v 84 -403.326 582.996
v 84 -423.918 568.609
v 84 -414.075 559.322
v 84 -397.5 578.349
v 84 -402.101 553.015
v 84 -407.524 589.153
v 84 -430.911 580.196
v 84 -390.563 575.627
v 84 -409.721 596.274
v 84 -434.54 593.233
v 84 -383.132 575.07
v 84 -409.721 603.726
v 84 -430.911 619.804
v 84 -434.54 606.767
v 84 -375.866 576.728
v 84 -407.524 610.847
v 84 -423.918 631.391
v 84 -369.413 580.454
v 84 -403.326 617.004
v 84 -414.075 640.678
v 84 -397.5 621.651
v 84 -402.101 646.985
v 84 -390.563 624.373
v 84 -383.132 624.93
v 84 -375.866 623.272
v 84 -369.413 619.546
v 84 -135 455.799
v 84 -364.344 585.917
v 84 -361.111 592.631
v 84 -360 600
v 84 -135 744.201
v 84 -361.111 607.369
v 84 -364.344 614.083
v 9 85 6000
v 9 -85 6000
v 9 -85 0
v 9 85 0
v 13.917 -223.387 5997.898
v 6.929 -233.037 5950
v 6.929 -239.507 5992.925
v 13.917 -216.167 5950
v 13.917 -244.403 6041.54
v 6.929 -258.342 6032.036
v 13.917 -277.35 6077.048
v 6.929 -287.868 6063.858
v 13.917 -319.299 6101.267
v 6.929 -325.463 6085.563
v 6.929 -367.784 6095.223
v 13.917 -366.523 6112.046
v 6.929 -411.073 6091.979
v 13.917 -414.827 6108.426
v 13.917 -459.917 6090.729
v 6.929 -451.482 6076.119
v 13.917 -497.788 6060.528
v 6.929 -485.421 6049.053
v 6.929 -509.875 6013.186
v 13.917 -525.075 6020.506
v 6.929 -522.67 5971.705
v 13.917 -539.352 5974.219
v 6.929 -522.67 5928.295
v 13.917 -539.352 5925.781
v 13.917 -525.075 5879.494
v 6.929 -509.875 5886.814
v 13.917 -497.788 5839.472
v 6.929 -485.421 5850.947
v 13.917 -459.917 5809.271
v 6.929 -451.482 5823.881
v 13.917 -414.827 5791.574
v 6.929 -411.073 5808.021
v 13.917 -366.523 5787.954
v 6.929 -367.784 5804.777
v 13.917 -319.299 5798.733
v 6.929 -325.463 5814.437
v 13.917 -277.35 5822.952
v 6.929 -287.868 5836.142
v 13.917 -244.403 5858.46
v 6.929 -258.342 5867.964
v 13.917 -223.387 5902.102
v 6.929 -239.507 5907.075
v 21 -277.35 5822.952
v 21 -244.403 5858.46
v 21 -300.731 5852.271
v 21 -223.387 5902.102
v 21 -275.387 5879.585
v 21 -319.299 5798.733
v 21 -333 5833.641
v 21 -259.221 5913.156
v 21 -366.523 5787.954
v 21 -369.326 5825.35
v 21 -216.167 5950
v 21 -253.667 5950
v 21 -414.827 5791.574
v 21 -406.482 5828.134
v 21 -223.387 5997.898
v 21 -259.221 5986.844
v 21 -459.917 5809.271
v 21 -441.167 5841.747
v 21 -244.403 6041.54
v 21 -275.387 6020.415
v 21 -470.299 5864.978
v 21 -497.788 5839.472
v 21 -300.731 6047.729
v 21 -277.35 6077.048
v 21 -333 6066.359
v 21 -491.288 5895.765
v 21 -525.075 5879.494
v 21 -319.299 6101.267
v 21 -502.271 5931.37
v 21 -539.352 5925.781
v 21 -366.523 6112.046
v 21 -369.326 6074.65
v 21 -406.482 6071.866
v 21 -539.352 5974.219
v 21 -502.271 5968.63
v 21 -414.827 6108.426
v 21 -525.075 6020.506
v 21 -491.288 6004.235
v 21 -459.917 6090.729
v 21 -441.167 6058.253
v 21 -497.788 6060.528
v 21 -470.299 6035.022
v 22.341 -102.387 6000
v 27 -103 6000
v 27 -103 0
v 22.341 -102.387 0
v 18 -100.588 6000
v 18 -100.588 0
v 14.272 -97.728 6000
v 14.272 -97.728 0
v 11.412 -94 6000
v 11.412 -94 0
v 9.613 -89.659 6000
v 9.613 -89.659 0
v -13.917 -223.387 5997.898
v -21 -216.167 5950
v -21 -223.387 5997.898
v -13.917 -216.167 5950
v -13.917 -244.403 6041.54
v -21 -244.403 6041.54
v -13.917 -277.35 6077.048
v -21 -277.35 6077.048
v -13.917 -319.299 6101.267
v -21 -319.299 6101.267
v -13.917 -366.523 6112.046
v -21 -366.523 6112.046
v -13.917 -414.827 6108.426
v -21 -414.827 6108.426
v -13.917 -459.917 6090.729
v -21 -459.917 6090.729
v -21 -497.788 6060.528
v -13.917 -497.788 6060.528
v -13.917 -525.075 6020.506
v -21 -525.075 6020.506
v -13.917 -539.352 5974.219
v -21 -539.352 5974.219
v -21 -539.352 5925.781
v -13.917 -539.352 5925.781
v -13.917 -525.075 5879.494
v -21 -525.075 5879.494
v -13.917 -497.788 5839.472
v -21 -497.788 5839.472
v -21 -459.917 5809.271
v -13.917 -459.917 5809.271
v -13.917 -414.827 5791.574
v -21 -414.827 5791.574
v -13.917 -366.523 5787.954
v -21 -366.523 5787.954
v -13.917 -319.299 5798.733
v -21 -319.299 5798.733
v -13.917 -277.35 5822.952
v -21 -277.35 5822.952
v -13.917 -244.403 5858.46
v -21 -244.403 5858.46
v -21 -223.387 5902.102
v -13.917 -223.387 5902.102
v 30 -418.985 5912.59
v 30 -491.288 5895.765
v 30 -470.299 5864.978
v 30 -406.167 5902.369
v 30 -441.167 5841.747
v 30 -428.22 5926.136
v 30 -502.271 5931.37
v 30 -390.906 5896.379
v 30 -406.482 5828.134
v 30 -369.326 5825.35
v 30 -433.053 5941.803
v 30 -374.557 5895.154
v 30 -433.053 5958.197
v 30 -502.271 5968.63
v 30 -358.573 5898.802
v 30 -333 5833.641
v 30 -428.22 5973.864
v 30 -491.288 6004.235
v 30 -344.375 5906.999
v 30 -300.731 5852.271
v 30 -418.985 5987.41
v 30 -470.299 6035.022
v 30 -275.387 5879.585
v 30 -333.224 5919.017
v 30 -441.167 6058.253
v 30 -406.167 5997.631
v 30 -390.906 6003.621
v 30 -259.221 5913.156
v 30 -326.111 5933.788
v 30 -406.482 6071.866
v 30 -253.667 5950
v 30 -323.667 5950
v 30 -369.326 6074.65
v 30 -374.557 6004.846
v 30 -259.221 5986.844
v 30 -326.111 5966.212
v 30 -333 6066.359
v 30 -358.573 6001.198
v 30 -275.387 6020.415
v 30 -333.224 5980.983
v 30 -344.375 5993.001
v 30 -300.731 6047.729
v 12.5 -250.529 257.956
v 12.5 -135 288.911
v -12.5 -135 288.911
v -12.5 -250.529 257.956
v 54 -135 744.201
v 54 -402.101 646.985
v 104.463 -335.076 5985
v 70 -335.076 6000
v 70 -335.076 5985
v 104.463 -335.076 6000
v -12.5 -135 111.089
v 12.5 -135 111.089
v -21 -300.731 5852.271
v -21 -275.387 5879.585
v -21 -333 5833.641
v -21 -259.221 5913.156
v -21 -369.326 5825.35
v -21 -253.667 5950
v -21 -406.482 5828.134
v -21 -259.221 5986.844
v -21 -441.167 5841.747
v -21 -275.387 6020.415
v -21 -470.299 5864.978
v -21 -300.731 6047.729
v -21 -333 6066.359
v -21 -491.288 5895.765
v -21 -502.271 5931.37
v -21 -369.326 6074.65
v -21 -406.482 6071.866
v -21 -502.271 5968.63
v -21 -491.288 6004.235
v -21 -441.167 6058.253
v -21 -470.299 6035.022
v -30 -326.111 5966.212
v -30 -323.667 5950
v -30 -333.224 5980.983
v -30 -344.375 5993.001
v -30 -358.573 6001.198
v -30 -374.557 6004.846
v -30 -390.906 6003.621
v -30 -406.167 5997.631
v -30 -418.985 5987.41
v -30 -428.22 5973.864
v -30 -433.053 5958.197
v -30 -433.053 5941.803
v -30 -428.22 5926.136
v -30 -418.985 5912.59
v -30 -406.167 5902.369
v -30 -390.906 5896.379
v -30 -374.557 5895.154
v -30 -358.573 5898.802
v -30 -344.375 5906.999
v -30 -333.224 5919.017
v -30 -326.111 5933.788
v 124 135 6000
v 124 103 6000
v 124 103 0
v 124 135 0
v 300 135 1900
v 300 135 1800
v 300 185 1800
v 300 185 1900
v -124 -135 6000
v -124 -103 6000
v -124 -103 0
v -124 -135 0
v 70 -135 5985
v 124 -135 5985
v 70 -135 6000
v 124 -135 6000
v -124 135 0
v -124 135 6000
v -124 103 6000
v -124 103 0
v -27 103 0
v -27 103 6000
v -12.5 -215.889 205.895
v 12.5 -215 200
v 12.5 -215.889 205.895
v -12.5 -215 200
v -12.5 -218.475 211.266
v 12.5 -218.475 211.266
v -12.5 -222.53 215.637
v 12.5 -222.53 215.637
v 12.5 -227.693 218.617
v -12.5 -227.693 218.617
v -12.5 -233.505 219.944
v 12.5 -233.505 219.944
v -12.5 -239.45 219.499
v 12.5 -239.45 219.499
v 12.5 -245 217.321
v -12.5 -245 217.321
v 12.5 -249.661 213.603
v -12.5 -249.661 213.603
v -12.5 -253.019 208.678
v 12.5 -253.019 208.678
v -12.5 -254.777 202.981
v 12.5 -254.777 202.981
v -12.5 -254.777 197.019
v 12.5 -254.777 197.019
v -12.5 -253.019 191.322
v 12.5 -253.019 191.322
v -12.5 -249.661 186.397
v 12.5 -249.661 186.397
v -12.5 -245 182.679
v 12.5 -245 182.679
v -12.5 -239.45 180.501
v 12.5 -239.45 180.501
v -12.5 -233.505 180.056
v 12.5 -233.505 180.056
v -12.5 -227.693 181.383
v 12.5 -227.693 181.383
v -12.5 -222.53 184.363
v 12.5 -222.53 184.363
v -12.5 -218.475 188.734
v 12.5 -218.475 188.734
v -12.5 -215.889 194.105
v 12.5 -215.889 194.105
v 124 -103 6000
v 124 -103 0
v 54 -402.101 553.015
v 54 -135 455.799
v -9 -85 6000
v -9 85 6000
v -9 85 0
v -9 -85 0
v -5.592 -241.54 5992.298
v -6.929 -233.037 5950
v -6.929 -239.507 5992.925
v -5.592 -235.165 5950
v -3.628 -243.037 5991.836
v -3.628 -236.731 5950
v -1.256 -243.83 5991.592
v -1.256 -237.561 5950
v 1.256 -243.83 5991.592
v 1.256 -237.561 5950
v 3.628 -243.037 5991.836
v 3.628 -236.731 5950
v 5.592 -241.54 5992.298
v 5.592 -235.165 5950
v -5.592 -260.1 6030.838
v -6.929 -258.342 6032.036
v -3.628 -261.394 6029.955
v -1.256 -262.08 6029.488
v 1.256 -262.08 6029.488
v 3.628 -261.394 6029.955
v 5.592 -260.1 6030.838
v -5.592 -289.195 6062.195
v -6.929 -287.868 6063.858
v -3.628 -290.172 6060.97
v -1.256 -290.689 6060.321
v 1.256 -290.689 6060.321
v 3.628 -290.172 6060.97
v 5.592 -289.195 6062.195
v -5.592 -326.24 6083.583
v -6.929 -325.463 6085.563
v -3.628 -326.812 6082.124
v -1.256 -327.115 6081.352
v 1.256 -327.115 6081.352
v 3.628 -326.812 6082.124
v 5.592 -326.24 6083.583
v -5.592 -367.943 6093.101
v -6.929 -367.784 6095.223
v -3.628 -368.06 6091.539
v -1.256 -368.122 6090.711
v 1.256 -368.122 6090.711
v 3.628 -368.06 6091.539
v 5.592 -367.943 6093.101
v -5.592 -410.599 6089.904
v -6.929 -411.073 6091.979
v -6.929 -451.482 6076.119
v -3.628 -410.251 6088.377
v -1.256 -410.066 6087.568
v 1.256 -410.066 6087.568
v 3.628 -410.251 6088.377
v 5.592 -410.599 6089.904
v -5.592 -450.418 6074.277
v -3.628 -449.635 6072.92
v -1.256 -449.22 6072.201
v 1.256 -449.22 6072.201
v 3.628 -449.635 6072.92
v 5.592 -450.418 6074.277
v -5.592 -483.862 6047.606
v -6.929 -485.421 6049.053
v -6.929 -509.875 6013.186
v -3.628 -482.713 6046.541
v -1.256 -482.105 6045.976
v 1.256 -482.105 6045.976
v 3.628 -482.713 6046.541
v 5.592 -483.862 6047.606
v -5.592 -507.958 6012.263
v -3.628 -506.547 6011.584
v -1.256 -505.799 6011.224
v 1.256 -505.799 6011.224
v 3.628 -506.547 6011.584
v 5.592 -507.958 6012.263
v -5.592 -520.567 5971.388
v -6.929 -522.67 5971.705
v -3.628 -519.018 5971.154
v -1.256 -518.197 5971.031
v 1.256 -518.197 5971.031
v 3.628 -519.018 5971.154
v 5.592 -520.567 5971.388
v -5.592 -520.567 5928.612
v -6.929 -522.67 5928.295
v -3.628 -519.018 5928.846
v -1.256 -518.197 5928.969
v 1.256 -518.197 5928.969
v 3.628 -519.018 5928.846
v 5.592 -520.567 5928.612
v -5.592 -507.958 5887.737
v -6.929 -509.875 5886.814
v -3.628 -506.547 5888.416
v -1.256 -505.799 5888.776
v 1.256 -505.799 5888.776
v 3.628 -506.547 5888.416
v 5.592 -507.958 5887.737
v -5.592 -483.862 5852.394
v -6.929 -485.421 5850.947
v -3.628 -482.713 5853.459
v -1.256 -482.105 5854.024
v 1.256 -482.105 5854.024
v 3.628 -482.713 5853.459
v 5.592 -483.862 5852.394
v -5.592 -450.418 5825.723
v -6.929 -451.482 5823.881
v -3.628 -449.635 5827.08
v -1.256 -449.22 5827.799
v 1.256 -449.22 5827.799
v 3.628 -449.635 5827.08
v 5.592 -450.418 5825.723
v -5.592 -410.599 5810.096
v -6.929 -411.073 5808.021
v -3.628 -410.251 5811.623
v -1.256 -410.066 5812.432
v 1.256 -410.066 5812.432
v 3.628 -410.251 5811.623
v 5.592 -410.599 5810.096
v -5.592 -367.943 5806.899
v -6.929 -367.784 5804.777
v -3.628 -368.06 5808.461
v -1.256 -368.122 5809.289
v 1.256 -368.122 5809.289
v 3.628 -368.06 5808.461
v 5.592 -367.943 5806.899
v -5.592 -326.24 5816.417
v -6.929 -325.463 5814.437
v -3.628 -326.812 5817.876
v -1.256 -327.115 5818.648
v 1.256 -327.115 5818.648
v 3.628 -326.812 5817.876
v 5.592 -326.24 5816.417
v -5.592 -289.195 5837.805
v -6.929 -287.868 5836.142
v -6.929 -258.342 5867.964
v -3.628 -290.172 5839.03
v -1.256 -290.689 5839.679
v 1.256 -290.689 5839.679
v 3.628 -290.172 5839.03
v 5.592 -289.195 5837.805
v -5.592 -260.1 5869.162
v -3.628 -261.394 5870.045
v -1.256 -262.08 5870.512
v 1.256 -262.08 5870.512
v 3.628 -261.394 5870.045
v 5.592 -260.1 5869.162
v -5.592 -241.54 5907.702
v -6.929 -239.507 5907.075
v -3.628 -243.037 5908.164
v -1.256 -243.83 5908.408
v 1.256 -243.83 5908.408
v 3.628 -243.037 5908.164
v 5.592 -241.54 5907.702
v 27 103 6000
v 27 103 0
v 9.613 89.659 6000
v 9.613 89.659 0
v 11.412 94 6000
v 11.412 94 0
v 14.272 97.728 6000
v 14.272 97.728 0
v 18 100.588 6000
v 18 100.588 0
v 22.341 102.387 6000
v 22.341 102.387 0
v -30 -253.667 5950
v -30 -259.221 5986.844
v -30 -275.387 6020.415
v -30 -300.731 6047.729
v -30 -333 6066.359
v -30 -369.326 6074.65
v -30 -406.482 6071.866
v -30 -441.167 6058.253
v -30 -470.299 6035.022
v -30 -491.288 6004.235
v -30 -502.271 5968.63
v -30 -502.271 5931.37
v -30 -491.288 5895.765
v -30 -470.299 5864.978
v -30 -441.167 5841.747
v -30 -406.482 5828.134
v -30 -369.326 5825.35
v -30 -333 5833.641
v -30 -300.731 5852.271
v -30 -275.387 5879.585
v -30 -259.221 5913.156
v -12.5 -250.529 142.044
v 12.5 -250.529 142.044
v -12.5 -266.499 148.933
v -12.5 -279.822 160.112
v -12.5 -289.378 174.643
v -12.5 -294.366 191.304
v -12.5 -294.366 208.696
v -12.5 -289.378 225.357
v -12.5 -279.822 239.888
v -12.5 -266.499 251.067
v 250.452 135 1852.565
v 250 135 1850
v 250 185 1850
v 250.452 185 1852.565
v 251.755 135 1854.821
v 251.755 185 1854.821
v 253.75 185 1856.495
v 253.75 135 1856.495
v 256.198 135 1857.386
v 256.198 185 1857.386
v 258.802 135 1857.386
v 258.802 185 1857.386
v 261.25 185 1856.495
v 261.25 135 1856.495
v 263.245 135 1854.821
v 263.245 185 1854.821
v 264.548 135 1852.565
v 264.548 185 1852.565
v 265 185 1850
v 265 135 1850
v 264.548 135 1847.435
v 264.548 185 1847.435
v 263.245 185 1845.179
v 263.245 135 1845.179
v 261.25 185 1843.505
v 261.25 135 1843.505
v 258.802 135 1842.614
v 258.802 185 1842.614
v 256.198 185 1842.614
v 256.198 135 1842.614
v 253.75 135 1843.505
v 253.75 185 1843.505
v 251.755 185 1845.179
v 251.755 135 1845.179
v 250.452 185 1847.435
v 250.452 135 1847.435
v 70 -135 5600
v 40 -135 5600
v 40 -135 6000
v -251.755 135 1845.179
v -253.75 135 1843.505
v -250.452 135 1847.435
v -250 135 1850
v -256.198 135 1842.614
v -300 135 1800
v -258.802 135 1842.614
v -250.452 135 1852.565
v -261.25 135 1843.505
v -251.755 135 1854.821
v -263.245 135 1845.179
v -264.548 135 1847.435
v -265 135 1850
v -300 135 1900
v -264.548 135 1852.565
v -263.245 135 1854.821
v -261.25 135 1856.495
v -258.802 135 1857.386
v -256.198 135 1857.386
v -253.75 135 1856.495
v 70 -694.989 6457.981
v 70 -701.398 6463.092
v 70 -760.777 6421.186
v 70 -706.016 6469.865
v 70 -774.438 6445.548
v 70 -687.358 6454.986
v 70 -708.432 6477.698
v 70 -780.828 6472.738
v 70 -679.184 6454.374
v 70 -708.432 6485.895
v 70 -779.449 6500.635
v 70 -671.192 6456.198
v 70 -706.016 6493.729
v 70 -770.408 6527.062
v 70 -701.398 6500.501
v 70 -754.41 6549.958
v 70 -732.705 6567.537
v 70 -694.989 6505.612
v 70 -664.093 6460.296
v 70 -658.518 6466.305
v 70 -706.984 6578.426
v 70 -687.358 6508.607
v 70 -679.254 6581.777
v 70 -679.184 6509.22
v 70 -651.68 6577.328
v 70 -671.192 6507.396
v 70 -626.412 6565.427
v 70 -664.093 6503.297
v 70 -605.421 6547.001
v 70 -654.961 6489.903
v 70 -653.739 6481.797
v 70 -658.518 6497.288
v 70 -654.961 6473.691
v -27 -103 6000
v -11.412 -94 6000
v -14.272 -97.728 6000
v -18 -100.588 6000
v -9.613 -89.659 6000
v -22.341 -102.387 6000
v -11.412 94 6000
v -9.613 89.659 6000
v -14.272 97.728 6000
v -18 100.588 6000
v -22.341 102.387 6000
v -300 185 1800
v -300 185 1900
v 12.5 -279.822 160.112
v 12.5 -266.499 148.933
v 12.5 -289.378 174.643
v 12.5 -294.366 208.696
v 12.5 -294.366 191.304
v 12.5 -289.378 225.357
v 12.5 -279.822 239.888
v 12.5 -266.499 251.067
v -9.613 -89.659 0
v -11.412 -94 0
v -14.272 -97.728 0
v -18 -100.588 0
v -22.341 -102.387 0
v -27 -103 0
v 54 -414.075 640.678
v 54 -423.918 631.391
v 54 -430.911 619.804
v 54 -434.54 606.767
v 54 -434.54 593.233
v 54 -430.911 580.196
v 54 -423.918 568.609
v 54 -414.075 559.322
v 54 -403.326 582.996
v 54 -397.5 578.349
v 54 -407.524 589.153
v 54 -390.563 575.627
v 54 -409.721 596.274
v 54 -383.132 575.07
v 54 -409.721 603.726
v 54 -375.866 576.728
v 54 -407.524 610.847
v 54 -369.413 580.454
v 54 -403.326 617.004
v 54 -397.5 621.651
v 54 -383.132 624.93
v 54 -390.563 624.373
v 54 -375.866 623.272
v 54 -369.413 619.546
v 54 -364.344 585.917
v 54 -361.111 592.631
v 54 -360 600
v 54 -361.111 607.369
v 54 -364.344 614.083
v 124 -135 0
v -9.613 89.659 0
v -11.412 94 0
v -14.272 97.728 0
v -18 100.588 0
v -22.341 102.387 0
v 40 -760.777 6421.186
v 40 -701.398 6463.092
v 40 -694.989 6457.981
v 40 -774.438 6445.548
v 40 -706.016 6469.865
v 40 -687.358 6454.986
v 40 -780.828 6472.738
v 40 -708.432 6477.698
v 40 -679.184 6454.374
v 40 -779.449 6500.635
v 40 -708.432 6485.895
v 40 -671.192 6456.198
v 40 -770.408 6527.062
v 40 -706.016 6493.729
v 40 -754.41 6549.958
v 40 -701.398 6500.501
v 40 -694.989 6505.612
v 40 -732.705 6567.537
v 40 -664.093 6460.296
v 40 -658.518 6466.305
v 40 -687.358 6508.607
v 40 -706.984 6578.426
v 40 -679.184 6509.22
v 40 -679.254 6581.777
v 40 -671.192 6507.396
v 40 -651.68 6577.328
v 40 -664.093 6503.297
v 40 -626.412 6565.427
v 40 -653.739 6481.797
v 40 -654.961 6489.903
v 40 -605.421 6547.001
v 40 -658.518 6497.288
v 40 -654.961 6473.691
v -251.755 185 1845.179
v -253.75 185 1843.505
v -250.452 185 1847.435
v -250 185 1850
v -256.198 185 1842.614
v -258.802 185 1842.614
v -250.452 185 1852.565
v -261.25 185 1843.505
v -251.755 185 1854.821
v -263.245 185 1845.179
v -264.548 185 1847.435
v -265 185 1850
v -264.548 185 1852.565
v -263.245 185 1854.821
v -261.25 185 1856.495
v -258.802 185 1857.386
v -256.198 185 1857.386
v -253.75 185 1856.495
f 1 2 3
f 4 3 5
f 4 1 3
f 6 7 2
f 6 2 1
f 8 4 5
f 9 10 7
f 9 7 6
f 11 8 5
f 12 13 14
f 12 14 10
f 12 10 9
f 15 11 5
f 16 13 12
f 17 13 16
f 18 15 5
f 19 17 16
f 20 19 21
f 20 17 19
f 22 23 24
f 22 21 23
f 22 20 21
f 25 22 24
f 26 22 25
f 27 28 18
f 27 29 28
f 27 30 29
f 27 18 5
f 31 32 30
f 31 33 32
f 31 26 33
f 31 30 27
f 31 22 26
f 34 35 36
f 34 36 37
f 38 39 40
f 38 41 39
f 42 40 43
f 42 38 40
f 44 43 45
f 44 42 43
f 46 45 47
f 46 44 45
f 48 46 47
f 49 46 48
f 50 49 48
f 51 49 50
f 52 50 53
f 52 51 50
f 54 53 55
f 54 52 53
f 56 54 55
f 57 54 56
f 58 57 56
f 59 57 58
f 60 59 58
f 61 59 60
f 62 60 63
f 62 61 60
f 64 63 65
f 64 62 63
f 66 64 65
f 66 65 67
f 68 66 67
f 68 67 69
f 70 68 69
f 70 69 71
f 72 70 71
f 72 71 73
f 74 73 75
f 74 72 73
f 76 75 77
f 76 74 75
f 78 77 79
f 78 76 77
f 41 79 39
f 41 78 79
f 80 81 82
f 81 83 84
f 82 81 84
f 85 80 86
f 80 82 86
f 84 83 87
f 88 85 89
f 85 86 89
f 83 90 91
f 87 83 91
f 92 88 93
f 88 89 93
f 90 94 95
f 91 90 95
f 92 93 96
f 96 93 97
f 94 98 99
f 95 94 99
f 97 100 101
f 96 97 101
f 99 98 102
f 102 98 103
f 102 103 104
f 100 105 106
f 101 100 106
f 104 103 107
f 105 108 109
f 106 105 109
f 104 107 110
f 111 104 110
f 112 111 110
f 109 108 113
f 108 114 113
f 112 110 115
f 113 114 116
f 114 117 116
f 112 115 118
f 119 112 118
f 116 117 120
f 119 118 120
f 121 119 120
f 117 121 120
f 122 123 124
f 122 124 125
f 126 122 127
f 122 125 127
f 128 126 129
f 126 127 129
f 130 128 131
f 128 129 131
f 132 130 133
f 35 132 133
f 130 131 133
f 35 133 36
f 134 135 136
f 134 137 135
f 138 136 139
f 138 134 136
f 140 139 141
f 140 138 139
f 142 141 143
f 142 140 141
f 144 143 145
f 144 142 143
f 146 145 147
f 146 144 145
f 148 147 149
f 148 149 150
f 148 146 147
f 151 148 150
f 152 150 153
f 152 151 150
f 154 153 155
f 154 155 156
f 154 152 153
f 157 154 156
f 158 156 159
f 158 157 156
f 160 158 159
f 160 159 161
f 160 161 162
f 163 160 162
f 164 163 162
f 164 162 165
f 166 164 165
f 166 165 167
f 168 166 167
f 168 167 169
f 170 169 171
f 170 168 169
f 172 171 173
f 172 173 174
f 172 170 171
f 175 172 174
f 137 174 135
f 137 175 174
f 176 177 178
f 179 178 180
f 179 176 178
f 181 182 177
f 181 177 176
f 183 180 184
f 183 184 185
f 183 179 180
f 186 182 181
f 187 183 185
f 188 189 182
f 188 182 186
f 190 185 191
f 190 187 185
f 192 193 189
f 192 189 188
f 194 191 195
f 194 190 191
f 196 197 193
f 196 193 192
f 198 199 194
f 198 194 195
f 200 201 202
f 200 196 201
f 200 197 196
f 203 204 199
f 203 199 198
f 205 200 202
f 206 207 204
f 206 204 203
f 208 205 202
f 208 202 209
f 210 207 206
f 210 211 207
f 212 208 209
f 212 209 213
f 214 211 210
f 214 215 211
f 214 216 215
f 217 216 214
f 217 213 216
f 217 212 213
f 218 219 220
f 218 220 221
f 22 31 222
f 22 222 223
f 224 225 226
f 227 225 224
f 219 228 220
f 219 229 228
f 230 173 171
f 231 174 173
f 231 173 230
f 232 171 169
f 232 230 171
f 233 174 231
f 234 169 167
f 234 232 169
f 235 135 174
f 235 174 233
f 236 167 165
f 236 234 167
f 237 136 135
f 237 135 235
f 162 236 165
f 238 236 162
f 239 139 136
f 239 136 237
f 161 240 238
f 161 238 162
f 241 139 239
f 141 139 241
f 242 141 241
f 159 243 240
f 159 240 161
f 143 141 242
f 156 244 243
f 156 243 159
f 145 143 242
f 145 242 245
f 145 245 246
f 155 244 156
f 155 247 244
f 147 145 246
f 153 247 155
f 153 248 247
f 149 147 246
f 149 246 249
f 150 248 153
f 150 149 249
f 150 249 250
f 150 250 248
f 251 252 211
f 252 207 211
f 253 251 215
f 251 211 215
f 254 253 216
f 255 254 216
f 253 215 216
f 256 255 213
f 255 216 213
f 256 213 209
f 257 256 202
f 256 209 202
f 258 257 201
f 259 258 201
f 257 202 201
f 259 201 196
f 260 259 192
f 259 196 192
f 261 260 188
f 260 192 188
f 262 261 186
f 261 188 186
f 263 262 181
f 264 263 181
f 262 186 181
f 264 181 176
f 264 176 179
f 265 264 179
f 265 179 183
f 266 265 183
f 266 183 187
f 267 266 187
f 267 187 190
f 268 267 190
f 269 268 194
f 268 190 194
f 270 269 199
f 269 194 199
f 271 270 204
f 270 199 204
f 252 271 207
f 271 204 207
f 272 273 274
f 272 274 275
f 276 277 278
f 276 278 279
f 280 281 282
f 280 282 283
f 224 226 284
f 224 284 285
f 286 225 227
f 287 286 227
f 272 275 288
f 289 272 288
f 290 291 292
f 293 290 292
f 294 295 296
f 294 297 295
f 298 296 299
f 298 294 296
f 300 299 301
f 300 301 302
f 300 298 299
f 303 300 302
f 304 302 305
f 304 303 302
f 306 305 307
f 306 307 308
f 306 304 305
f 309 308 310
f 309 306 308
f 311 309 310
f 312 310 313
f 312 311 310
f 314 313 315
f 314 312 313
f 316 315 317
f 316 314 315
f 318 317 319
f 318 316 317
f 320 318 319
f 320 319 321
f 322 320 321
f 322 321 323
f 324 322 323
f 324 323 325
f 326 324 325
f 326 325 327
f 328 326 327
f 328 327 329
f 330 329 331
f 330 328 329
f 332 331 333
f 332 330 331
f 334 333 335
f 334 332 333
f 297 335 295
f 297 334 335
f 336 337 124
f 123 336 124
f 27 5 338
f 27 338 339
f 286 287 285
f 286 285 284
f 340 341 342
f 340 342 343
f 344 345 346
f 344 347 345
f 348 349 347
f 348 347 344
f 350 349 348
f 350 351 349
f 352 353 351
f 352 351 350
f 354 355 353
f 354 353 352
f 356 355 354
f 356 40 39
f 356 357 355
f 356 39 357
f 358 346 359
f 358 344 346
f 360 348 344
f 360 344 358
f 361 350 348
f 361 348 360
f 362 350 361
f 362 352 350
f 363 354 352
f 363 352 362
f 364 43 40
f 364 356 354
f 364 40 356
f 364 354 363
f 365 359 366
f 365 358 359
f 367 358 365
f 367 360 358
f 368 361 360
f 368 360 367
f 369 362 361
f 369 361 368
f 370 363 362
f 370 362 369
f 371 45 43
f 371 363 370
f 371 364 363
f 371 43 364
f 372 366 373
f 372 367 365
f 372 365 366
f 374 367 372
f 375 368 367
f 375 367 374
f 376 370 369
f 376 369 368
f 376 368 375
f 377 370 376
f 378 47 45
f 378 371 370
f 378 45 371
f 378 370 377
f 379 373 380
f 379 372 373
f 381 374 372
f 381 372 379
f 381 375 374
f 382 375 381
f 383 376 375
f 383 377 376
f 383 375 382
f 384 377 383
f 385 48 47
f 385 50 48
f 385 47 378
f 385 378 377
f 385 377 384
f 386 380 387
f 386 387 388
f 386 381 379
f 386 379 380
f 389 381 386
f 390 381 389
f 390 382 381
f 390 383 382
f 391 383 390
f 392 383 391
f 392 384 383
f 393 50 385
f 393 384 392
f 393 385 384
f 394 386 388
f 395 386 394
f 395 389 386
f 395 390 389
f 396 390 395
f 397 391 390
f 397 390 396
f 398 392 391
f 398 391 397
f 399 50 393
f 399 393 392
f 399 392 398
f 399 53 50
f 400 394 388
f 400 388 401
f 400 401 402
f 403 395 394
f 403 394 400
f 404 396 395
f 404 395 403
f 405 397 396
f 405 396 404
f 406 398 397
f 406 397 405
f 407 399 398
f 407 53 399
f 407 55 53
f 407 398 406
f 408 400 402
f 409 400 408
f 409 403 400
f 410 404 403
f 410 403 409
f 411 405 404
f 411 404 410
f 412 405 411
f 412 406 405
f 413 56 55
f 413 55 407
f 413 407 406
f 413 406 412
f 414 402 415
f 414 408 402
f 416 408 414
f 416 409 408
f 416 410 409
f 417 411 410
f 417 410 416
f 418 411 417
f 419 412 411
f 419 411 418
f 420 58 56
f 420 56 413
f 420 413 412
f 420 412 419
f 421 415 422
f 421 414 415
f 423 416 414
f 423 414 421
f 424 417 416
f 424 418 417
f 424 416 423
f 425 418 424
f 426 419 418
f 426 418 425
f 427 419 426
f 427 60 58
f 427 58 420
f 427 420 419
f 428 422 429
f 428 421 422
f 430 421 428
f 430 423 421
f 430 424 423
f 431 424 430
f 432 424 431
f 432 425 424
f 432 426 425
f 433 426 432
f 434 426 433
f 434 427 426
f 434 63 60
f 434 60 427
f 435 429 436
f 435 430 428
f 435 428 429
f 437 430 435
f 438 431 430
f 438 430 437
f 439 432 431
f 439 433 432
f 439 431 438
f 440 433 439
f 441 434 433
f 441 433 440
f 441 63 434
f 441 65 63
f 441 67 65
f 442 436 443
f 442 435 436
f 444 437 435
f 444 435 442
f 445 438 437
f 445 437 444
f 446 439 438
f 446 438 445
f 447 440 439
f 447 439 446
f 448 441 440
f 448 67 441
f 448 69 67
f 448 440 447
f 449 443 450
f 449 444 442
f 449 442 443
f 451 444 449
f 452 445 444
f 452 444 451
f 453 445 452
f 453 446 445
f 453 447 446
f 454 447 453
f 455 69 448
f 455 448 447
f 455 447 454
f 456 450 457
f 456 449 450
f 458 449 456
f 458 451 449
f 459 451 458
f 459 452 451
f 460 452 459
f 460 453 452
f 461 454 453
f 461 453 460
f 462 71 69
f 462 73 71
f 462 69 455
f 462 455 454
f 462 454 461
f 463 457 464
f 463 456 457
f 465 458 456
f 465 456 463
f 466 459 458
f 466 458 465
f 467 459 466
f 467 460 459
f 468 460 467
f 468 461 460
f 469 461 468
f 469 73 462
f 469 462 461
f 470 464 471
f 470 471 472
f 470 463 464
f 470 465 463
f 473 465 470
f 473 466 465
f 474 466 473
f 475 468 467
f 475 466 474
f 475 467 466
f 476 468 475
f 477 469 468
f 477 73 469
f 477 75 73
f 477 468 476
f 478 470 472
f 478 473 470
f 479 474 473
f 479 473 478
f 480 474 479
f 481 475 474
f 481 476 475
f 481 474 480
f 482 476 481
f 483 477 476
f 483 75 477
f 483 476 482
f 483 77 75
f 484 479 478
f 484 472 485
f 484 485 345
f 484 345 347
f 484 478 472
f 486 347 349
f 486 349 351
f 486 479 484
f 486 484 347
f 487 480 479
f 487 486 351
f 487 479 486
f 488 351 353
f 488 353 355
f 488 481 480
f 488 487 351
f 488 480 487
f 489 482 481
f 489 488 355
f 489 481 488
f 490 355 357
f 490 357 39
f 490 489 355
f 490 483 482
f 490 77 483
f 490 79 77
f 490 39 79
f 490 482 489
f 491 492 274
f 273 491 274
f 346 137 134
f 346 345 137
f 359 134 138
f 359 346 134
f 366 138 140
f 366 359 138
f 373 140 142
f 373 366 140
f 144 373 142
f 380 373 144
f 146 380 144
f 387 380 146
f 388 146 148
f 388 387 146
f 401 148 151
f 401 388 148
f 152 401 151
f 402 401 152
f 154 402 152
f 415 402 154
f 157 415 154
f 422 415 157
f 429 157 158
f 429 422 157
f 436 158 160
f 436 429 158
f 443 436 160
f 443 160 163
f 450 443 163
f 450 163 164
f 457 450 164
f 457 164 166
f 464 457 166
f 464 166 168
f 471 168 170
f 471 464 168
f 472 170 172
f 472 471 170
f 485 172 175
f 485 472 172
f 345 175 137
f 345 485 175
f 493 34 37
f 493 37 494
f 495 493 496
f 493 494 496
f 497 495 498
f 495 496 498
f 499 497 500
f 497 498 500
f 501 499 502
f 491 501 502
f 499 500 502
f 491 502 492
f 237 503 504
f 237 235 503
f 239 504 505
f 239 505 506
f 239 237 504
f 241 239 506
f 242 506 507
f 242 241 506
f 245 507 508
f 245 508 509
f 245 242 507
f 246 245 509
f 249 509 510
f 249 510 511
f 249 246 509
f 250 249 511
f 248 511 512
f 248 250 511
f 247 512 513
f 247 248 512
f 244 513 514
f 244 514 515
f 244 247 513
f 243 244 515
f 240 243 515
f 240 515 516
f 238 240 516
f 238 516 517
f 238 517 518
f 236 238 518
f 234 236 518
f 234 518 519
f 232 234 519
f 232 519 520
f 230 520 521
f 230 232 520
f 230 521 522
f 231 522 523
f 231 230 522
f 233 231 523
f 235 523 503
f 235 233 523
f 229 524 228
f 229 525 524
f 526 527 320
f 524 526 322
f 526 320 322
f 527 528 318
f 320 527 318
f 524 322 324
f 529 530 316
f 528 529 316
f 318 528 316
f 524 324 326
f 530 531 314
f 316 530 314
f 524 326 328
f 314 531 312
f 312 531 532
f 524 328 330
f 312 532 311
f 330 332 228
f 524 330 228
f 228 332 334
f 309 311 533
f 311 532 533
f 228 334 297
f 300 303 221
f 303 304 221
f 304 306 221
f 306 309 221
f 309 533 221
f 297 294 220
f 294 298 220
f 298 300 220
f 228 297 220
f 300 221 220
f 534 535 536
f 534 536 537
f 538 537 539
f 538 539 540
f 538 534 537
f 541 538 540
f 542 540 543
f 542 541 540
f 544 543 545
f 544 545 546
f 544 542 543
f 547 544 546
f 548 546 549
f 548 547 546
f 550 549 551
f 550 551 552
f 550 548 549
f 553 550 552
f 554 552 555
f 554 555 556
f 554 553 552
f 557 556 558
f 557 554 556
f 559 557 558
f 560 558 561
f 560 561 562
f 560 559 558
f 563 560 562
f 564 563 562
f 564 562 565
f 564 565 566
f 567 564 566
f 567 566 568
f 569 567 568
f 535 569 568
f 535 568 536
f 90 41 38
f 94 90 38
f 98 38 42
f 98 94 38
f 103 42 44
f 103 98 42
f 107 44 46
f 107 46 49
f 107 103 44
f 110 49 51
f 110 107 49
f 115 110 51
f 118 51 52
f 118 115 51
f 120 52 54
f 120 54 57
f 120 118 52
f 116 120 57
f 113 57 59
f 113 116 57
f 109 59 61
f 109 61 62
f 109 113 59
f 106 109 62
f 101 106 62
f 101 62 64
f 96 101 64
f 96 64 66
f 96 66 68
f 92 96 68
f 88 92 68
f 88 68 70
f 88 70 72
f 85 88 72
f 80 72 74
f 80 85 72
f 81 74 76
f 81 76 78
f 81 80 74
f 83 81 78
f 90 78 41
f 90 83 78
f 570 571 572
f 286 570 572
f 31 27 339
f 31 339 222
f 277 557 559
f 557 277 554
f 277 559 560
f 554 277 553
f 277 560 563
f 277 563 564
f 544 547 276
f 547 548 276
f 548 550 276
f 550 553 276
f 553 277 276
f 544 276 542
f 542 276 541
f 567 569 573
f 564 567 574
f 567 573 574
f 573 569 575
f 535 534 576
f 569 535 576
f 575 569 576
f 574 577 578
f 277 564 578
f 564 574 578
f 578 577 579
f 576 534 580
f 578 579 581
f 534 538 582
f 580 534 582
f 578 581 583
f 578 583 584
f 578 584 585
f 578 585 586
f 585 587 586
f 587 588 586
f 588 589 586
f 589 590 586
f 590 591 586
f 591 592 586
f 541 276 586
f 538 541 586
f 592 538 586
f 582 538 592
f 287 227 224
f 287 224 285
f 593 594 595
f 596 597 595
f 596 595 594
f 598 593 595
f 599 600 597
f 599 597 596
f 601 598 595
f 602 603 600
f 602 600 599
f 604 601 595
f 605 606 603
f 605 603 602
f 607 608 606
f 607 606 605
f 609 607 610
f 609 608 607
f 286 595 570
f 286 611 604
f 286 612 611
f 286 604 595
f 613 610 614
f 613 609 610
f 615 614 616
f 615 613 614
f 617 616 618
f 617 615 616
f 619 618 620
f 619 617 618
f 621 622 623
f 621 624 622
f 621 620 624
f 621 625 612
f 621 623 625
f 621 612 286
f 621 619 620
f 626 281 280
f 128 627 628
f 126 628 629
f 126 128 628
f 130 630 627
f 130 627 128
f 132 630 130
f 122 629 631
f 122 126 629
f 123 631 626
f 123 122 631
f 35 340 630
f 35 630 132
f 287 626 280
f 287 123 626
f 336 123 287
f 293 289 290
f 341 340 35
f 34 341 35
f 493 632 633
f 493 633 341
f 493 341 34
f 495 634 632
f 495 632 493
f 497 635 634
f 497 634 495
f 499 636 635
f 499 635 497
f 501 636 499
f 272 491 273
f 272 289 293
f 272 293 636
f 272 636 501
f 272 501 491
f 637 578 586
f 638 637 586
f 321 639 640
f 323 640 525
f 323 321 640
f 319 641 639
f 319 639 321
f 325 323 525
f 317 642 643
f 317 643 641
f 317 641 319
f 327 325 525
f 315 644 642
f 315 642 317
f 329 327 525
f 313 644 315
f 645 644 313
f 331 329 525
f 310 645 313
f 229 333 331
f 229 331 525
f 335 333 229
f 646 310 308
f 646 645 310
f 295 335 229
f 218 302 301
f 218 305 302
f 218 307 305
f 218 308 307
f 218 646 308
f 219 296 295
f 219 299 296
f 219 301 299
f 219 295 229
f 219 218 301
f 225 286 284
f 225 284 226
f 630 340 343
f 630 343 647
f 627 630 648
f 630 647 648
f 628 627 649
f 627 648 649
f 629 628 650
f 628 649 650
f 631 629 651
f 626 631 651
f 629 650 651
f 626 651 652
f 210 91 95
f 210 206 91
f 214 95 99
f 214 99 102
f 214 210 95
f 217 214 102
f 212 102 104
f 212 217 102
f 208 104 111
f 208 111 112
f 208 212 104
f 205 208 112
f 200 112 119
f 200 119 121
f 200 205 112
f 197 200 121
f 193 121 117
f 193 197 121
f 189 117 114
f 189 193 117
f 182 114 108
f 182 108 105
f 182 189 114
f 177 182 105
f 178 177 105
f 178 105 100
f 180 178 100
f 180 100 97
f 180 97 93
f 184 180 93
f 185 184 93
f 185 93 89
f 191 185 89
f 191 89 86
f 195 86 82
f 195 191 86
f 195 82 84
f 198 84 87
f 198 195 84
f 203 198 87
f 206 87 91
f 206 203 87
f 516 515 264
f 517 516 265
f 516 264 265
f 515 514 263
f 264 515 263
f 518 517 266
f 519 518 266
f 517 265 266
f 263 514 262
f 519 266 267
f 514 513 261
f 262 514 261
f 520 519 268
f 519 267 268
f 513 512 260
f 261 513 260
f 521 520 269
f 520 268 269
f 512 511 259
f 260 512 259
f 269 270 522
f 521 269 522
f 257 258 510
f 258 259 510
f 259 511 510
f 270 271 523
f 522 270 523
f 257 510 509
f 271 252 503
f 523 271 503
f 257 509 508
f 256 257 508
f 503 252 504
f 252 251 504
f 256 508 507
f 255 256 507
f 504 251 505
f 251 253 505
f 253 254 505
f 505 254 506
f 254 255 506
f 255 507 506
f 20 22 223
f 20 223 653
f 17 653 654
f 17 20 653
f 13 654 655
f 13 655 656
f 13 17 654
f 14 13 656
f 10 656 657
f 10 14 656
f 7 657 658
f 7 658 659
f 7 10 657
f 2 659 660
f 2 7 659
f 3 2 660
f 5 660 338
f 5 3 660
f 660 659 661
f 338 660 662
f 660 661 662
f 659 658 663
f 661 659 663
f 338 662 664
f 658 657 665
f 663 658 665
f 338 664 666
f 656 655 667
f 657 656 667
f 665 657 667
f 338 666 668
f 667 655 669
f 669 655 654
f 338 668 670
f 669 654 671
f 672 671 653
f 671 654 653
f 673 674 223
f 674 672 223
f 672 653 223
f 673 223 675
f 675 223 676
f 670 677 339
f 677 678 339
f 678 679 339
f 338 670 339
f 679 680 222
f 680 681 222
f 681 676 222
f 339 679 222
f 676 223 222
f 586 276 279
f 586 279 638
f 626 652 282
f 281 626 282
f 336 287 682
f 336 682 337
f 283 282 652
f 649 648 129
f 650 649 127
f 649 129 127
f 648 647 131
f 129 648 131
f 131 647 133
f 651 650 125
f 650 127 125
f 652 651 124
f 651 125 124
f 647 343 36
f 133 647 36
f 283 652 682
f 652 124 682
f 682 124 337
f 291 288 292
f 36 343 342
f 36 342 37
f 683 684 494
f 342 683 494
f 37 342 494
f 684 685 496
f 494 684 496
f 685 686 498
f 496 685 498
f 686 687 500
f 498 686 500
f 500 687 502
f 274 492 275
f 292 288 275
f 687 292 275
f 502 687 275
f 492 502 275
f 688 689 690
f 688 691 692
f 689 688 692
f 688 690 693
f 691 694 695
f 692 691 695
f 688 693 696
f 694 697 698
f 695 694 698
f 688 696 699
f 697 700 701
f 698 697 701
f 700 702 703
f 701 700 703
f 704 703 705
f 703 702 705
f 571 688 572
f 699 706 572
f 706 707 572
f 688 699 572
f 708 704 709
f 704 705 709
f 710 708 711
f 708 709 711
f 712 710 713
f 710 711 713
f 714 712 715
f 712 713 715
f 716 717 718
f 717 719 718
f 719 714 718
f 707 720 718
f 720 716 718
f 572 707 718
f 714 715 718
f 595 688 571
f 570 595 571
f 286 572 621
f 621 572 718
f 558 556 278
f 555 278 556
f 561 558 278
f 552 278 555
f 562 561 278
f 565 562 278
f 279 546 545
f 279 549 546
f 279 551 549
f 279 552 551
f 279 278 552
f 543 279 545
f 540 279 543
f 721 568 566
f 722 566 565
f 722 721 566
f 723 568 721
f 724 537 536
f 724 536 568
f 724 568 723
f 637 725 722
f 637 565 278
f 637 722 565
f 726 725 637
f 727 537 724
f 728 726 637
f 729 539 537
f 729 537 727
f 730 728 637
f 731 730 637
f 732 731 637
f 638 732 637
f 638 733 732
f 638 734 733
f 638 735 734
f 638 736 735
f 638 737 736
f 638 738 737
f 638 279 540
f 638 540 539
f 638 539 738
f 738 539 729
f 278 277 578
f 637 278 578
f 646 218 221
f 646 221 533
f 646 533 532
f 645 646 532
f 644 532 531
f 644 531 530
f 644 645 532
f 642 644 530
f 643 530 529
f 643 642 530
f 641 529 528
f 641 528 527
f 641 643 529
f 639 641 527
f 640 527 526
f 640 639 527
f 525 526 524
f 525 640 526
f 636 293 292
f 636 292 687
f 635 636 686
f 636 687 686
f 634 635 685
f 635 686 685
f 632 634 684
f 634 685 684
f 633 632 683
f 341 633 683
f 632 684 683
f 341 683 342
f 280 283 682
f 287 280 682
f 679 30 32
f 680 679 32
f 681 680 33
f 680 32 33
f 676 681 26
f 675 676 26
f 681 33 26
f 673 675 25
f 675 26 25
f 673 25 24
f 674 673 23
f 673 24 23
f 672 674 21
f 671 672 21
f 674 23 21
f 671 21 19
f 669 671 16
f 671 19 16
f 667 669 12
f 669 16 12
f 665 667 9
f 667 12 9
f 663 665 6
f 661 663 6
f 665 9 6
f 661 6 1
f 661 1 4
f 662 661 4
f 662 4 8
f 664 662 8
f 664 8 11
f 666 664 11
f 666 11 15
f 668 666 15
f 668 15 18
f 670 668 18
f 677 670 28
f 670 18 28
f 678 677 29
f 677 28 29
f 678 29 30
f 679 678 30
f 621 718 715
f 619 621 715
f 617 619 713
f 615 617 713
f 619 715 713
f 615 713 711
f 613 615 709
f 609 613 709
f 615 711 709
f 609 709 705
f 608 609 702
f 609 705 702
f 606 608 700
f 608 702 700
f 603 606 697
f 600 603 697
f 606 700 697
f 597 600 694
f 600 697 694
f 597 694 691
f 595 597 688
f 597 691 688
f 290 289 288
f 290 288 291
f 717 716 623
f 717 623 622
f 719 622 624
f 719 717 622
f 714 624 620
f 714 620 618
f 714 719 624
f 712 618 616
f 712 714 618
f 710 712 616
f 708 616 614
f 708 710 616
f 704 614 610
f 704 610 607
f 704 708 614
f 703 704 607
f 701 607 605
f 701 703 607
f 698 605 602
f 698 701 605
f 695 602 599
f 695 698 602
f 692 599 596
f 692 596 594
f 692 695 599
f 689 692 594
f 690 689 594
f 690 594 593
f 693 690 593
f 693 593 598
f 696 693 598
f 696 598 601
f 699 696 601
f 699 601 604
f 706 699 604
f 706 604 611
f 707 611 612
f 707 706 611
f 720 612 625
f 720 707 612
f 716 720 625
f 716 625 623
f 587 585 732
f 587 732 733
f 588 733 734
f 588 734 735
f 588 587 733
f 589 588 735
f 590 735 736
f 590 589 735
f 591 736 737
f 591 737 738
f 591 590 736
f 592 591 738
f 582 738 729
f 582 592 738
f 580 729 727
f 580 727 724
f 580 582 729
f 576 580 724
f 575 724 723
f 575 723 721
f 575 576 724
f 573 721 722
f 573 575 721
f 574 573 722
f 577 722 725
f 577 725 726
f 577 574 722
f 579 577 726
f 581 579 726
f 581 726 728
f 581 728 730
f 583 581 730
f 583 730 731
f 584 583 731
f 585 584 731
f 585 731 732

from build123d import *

# Parameters (mm, degrees)
F1_DEPTH  = 6000
F3_START  = -40
F2_R      = 25
F3_DEPTH  = 30
F5_W      = 600
F5_H      = 100
F5_R      = 7.5
F6_DEPTH  = 50
F8_R      = 20
F9_DEPTH  = 12.5
F11_START = 40
F10_R     = 27.5
F11_DEPTH = 30
F4_R      = 162.5
F4_R_2    = 19.1642620286
F12_DEPTH = 30
F13_W     = 9
F13_H     = 37.5
F13_W_2   = 60
F13_H_2   = 55
F16_DEPTH = 15


with BuildPart() as f1:
    # F0 (on Top) → F1 (new body)
    with BuildSketch(Plane.XY):
        with BuildLine():
            Line((124, 135), (0, 135))
            Line((0, 135), (-124, 135))
            Line((-124, 135), (-124, 103))
            Line((-124, 103), (-27, 103))
            ThreePointArc((-27, 103), (-14.2720779386, 97.7279220614), (-9, 85))
            Line((-9, 85), (-9, 0))
            Line((-9, 0), (-9, -85))
            ThreePointArc((-9, -85), (-14.2720779386, -97.7279220614), (-27, -103))
            Line((-27, -103), (-124, -103))
            Line((-124, -103), (-124, -135))
            Line((-124, -135), (0, -135))
            Line((0, -135), (124, -135))
            Line((124, -135), (124, -103))
            Line((124, -103), (27, -103))
            ThreePointArc((27, -103), (14.2720779386, -97.7279220614), (9, -85))
            Line((9, -85), (9, 0))
            Line((9, 0), (9, 85))
            ThreePointArc((9, 85), (14.2720779386, 97.7279220614), (27, 103))
            Line((27, 103), (124, 103))
            Line((124, 103), (124, 135))
        make_face()
    extrude(amount=F1_DEPTH)


with BuildPart() as f3:
    # F2 (on face) → F3 (new body)
    with BuildSketch(Plane.YZ.offset(124).offset(F3_START)):
        with BuildLine():
            Line((-135, 455.7985528097), (-135, 744.2014471903))
            Line((-135, 744.2014471903), (-402.1010071663, 646.9846310393))
            ThreePointArc((-402.1010071663, 646.9846310393), (-435, 600), (-402.1010071663, 553.0153689607))
            Line((-402.1010071663, 553.0153689607), (-135, 455.7985528097))
        make_face()
        with Locations((-385, 600)):
            Circle(F2_R, mode=Mode.SUBTRACT)
    extrude(amount=-F3_DEPTH)


with BuildPart() as f6:
    # F5 (on face) → F6 (new body)
    with BuildSketch(Plane(origin=(0, 135, 0), x_dir=(-1, 0, 0), z_dir=(0, 1, 0))):
        with Locations((0, 1850)):
            Rectangle(F5_W, F5_H)
        with Locations((-257.5, 1850)):
            Circle(F5_R, mode=Mode.SUBTRACT)
        with Locations((257.5, 1850)):
            Circle(F5_R, mode=Mode.SUBTRACT)
    extrude(amount=F6_DEPTH)


with BuildPart() as f9:
    # F8 (on Right) → F9 (new body, symmetric)
    with BuildSketch(Plane.YZ):
        with BuildLine():
            Line((-135, 111.0885099323), (-135, 288.9114900677))
            Line((-135, 288.9114900677), (-250.5291427062, 257.9555495773))
            ThreePointArc((-250.5291427062, 257.9555495773), (-295, 200), (-250.5291427062, 142.0444504227))
            Line((-250.5291427062, 142.0444504227), (-135, 111.0885099323))
        make_face()
        with Locations((-235, 200)):
            Circle(F8_R, mode=Mode.SUBTRACT)
    extrude(amount=F9_DEPTH, both=True)


with BuildPart() as f11:
    # F10 (on Right) → F11 (new body)
    with BuildSketch(Plane.YZ.offset(F11_START)):
        with BuildLine():
            Line((-135, 5600), (-135, 6000))
            Line((-135, 6000), (-605.4206107898, 6547.0006710523))
            ThreePointArc((-605.4206107898, 6547.0006710523), (-744.1741649128, 6559.50891005), (-760.7770757471, 6421.1855635881))
            Line((-760.7770757471, 6421.1855635881), (-135, 5600))
        make_face()
        with Locations((-681.2391281128, 6481.7967414856)):
            Circle(F10_R, mode=Mode.SUBTRACT)
    extrude(amount=F11_DEPTH)


with BuildPart() as f12:
    # F4 (on Right) → F12 (new body, symmetric)
    with BuildSketch(Plane.YZ):
        with Locations((-378.6671314531, 5950)):
            Circle(F4_R)
        with Locations((-378.6671314531, 5950)):
            Circle(F4_R_2, mode=Mode.SUBTRACT)
    extrude(amount=F12_DEPTH, both=True)

    # F13 (on plane+point) → F14 (revolve, cut)
    with BuildSketch(Plane.XY.offset(5950)):
        with Locations((-25.5, -234.9171314531)):
            Rectangle(F13_W, F13_H)
        with BuildLine():
            Line((13.9169313754, -216.1671314531), (-13.9169313754, -216.1671314531))
            Line((-13.9169313754, -216.1671314531), (-6.9290964938, -233.0372571958))
            ThreePointArc((-6.9290964938, -233.0372571958), (0, -237.6671314531), (6.9290964938, -233.0372571958))
            Line((6.9290964938, -233.0372571958), (13.9169313754, -216.1671314531))
        make_face()
        with Locations((25.5, -234.9171314531)):
            Rectangle(F13_W, F13_H)
        with Locations((0, -351.1671314531)):
            Rectangle(F13_W_2, F13_H_2)
    revolve(axis=Axis((0, -378.6671314531, 5950), (1, 0, 0)), mode=Mode.SUBTRACT)


with BuildPart() as f16:
    # F15 (on face) → F16 (new body)
    with BuildSketch(Plane.XY.offset(6000)):
        Polygon((70, -135), (70, -335.0761973858), (104.4628120399, -335.0761973858), (124, -135), align=None)
    extrude(amount=-F16_DEPTH)


solid = Compound([f1.part, f3.part, f6.part, f9.part, f11.part, f12.part, f16.part])
